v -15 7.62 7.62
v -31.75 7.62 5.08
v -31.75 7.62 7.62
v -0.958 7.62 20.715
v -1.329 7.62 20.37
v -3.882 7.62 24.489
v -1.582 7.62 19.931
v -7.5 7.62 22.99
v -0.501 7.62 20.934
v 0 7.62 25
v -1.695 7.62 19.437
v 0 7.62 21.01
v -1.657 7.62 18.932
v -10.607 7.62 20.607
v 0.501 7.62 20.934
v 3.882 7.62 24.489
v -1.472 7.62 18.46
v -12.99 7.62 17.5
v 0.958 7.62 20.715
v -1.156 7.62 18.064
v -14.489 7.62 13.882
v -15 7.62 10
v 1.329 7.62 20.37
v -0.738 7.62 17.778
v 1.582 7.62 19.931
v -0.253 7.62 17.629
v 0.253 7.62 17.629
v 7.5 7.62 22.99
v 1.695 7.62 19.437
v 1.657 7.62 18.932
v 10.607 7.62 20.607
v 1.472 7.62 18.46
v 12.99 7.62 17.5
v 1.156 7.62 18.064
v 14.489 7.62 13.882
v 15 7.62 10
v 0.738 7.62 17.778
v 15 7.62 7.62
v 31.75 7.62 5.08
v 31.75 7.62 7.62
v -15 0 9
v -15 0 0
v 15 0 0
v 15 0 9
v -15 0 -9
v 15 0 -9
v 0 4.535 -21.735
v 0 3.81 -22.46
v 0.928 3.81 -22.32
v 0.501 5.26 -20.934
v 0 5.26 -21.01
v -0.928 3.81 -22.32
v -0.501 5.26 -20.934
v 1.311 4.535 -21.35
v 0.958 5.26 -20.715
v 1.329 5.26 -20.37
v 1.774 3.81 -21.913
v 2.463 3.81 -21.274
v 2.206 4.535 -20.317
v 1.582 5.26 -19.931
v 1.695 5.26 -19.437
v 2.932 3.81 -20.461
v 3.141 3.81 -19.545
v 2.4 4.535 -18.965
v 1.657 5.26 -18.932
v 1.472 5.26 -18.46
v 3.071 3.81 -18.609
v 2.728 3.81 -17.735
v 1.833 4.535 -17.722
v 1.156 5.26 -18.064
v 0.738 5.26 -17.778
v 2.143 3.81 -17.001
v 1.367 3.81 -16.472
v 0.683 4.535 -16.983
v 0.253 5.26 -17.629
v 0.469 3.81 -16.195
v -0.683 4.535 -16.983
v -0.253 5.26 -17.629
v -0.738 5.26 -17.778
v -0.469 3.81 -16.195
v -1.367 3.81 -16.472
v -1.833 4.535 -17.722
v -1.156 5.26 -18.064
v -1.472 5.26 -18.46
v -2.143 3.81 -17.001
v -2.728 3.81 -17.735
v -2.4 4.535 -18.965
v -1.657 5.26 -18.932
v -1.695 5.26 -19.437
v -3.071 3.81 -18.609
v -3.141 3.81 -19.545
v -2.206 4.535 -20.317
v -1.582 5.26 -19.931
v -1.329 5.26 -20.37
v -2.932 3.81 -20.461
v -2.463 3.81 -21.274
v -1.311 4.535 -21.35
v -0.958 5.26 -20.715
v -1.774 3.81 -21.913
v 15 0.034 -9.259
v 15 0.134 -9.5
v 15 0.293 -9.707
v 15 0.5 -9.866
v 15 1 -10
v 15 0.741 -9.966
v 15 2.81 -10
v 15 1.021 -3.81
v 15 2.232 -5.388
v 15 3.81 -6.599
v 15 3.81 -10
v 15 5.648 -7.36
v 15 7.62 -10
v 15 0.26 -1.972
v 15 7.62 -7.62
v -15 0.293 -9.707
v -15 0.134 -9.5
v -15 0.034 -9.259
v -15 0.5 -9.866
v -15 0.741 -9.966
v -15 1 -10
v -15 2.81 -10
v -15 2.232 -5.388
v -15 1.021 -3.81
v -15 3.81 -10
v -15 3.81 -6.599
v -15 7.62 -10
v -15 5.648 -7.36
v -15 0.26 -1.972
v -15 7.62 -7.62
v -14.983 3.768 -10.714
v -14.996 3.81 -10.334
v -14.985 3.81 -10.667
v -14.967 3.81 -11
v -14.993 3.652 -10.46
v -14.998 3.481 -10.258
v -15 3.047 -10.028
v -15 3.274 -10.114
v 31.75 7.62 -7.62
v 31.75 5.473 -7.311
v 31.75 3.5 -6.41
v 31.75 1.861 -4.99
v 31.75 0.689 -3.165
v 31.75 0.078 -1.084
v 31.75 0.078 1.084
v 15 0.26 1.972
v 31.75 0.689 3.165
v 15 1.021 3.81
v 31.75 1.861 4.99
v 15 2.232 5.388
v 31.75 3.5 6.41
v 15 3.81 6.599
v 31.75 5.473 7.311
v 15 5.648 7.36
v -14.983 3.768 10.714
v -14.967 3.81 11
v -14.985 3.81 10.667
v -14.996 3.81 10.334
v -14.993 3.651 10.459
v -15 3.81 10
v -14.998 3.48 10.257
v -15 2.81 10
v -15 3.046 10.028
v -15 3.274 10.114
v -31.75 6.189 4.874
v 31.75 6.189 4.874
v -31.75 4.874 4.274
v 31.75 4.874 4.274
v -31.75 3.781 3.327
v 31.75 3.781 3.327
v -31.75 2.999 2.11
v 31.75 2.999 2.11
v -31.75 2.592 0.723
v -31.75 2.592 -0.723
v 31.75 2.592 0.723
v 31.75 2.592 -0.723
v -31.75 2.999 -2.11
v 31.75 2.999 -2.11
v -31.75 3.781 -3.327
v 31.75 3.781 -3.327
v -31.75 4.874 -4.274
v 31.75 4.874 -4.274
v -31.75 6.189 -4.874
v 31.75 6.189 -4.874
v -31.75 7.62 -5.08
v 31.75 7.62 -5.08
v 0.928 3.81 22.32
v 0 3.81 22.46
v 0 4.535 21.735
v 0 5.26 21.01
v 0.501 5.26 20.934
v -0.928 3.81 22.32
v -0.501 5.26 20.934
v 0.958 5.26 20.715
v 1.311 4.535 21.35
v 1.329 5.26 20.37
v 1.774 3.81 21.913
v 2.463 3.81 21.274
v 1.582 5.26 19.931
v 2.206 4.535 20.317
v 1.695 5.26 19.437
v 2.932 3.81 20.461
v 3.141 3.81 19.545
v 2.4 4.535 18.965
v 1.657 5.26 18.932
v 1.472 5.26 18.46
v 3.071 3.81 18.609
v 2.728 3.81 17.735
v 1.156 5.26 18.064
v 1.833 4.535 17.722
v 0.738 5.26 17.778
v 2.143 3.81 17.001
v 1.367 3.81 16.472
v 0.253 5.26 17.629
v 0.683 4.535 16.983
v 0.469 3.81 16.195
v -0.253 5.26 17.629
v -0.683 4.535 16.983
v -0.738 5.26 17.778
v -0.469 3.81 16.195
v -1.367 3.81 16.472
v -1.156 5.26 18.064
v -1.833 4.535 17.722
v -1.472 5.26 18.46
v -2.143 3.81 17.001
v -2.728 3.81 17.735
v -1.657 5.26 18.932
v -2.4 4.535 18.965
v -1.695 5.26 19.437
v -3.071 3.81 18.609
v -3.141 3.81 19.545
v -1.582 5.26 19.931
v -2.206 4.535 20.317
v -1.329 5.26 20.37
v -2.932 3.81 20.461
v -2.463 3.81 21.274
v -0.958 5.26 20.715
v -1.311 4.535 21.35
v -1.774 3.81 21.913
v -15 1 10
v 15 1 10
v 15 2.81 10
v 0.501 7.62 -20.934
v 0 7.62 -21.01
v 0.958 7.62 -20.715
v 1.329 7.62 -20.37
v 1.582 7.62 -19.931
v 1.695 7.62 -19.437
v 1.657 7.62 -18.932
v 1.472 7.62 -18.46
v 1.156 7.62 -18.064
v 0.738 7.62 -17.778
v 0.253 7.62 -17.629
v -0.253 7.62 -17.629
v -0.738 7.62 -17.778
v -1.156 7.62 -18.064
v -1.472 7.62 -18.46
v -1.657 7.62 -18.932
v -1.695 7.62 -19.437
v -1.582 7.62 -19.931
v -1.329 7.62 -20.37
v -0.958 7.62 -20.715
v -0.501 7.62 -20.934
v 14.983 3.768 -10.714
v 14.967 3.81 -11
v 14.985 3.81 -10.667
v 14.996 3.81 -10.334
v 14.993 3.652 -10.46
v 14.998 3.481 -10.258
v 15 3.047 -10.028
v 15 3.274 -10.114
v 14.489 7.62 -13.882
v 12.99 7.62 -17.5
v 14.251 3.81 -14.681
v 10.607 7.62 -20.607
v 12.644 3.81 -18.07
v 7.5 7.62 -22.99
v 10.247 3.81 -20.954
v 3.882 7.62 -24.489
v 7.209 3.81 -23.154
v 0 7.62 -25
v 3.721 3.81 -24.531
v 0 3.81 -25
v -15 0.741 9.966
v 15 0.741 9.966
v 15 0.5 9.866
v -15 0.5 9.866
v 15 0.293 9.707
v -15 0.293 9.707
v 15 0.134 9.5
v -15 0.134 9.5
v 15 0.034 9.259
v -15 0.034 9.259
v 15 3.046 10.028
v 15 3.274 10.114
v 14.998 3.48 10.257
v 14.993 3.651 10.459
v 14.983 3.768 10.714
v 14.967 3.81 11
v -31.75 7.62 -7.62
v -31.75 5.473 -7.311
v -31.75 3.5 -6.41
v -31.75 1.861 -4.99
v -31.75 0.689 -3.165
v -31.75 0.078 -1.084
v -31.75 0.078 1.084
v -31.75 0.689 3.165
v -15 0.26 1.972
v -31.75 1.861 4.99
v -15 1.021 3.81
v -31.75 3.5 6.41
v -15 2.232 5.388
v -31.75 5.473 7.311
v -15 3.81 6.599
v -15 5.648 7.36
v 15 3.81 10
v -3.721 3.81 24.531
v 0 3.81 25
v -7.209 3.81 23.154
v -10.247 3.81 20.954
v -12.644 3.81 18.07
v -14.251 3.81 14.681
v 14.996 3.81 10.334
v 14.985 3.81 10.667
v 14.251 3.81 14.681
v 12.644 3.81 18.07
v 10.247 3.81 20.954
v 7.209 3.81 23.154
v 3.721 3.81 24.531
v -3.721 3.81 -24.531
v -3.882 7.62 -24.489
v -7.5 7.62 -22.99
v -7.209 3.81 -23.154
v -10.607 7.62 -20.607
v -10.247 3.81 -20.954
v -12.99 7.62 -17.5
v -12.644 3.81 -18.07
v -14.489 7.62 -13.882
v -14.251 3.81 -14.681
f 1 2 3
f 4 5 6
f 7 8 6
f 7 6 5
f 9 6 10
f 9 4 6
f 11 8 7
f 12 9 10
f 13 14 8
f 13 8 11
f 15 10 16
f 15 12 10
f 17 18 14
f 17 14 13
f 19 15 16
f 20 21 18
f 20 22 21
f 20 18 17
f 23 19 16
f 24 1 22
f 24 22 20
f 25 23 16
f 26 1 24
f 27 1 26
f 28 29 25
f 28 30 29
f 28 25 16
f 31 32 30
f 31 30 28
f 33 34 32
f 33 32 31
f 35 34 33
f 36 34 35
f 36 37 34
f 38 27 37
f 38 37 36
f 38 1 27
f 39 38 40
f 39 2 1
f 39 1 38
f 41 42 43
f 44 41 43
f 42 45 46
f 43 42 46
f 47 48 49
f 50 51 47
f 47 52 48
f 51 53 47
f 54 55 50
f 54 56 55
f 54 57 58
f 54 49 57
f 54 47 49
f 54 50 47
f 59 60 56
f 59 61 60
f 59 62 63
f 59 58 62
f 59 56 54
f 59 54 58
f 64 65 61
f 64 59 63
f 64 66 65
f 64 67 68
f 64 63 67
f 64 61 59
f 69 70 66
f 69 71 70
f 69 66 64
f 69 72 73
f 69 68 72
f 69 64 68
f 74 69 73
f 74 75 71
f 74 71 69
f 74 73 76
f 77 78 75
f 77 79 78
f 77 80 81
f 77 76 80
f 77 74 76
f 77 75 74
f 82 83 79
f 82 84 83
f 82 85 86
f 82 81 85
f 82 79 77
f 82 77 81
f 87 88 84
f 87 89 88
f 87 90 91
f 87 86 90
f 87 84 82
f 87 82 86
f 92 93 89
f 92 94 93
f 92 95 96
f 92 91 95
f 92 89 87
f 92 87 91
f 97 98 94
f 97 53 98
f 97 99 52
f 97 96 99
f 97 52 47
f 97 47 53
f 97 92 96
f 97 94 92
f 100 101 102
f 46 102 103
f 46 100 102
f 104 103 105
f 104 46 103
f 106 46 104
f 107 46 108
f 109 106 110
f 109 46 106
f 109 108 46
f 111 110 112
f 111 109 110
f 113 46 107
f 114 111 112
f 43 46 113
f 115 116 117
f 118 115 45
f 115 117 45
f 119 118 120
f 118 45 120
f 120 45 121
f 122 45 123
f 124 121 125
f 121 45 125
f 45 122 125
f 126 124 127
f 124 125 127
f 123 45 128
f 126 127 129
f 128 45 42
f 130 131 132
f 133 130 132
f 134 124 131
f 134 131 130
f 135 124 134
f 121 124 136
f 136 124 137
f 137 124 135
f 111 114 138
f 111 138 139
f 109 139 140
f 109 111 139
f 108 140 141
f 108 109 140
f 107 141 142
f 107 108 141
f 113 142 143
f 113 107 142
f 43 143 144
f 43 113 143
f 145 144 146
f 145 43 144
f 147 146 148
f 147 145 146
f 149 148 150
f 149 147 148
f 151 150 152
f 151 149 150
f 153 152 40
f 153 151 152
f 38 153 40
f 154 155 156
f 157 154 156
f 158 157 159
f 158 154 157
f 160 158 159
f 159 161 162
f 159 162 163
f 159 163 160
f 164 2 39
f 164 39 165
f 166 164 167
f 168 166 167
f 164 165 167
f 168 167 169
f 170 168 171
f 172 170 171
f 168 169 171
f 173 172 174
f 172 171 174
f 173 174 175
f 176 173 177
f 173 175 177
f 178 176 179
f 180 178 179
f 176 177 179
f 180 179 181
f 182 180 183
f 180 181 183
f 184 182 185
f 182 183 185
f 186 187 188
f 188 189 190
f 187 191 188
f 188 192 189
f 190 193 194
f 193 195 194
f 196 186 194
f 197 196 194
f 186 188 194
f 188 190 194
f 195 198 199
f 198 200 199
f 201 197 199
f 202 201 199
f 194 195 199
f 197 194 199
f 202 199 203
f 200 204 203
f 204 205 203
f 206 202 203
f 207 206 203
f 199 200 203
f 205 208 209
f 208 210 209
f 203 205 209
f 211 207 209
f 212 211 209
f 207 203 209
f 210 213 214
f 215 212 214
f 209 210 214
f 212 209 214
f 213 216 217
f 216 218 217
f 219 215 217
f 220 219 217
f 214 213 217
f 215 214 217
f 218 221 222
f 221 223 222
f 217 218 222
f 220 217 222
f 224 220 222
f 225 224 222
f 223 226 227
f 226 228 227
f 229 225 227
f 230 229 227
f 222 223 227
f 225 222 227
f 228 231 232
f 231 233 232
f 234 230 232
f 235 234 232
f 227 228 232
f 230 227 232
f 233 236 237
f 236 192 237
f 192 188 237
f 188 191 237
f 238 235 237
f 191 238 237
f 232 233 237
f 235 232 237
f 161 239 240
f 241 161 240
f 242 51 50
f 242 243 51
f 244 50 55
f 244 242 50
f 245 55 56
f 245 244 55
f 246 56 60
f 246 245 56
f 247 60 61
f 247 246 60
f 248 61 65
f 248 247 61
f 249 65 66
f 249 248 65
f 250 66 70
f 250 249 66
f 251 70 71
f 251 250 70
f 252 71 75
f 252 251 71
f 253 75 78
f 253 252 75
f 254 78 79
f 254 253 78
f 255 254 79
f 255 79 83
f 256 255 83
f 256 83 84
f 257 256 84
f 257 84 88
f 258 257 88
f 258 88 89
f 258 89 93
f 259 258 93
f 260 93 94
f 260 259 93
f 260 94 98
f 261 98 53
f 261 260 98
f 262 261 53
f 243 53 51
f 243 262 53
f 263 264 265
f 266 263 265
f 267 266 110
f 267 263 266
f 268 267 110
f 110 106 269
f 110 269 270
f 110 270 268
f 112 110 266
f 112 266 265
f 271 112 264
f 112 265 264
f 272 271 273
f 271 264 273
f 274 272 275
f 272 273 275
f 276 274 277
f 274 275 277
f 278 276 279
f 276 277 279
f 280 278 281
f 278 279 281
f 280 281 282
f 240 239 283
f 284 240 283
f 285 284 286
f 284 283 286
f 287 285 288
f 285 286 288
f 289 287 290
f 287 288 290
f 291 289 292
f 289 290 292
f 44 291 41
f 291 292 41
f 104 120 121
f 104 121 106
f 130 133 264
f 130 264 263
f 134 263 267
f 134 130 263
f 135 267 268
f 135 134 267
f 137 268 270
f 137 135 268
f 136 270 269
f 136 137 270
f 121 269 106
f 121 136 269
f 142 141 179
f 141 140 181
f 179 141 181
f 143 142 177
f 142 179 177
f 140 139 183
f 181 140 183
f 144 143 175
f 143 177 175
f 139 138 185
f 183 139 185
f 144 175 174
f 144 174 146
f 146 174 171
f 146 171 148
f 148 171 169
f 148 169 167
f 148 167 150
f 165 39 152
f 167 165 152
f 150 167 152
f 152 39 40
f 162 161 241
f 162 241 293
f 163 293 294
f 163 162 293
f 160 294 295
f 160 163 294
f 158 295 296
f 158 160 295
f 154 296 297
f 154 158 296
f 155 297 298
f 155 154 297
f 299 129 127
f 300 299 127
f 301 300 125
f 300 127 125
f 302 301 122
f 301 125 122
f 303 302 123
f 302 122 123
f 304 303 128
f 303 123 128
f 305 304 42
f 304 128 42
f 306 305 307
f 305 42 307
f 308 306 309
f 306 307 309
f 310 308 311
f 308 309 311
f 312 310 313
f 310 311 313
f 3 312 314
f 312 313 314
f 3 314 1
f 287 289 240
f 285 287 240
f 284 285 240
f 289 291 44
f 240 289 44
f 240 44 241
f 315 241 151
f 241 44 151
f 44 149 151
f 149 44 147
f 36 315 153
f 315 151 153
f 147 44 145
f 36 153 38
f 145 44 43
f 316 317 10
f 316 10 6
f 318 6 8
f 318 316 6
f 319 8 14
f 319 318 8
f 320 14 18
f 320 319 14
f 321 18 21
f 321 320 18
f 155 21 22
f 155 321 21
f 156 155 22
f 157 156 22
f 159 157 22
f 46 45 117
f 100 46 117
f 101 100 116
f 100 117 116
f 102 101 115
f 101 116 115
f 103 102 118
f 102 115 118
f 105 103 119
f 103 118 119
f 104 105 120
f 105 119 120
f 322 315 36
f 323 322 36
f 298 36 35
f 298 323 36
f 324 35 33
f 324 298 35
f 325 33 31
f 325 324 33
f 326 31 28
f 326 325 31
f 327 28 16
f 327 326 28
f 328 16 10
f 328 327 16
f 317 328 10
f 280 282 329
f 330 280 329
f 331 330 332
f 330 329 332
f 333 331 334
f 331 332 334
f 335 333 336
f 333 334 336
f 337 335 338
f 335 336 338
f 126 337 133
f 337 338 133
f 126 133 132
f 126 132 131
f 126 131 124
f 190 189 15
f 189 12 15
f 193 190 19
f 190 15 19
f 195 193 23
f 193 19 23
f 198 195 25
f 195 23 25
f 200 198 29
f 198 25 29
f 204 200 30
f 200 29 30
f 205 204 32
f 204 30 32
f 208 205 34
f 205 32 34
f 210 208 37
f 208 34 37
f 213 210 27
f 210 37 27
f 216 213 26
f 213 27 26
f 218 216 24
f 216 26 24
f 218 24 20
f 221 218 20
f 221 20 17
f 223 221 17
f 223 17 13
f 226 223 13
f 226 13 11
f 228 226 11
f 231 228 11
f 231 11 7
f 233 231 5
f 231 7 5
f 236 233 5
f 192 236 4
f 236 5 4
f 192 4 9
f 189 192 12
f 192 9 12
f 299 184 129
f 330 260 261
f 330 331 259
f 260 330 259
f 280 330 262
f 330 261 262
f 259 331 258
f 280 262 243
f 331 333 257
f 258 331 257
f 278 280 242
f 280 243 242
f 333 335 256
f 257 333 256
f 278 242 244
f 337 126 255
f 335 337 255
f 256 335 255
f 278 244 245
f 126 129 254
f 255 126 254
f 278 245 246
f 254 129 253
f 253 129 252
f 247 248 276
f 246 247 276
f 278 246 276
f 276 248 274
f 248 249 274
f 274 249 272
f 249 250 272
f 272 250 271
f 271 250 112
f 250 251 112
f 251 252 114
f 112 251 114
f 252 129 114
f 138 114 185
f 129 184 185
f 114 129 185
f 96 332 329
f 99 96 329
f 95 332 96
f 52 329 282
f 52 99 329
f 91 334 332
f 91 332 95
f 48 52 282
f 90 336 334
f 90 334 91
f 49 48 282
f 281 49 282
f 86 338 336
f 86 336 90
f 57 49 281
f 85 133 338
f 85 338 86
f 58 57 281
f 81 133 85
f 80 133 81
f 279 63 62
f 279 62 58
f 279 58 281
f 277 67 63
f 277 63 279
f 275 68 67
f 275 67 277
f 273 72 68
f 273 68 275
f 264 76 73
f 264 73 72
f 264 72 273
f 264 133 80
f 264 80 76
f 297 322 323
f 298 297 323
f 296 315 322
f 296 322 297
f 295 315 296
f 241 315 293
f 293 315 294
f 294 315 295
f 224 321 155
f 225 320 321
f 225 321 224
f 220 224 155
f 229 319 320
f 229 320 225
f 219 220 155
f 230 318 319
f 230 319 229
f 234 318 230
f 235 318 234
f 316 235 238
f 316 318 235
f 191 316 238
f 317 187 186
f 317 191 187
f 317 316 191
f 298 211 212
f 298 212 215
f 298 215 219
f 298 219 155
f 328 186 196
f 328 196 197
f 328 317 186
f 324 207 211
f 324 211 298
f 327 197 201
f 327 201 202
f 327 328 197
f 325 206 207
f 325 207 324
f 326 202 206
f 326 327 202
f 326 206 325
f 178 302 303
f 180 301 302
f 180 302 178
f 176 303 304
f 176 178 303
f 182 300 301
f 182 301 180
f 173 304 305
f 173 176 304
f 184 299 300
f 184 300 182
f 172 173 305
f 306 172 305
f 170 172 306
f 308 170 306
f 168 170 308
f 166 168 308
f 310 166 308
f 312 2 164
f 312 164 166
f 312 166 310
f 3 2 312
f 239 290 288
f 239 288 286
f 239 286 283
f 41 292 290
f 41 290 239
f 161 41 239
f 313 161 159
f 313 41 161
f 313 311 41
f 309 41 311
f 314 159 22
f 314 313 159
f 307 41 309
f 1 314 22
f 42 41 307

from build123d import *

# Parameters (mm, degrees)
SKETCH1_W                                           = 30
SKETCH1_H                                           = 30
BOSS_EXTRUDE1_DEPTH                                 = 7.62
BOSS_EXTRUDE2_DEPTH                                 = 16.75
CUT_EXTRUDE2_DEPTH                                  = 35.39570322
SKETCH3_W                                           = 30
SKETCH3_H                                           = 3.81
BOSS_EXTRUDE3_DEPTH                                 = 10
CSK_FOR_M3_COUNTERSUNK_FLAT_HEAD_SCREW1_D           = 3.4
CSK_FOR_M3_COUNTERSUNK_FLAT_HEAD_SCREW1_CSINK_D     = 6.3
CSK_FOR_M3_COUNTERSUNK_FLAT_HEAD_SCREW1_CSINK_ANGLE = 90
CUT_EXTRUDE3_START                                  = -10
CUT_EXTRUDE3_DEPTH                                  = 52.123313339
SKETCH6_W                                           = 30
SKETCH6_H                                           = 5
CUT_EXTRUDE5_DEPTH                                  = 3.81
FILLET1_R                                           = 1


with BuildPart() as part:
    # Sketch1 → Boss-Extrude1 (new body)
    with BuildSketch(Plane(origin=(0, 0, 0), x_dir=(1, 0, 0), z_dir=(0, 1, 0))):
        Rectangle(SKETCH1_W, SKETCH1_H)
    extrude(amount=BOSS_EXTRUDE1_DEPTH)

    # Sketch2 → Boss-Extrude2 (add)
    with BuildSketch(Plane(origin=(15, 0, 0), x_dir=(0, 0, -1), z_dir=(1, 0, 0))):
        with BuildLine():
            Line((-7.62, 7.62), (-5.08, 7.62))
            ThreePointArc((-5.08, 7.62), (0, 2.54), (5.08, 7.62))
            Line((5.08, 7.62), (7.62, 7.62))
            ThreePointArc((7.62, 7.62), (0, 0), (-7.62, 7.62))
        make_face()
    boss_extrude2 = extrude(amount=BOSS_EXTRUDE2_DEPTH)

    # Sketch2<4> → Cut-Extrude2 (cut, through all)
    with BuildSketch(Plane(origin=(15, 0, 0), x_dir=(0, 0, -1), z_dir=(1, 0, 0))):
        with BuildLine():
            Line((5.08, 7.62), (-5.08, 7.62))
            ThreePointArc((-5.08, 7.62), (0, 2.54), (5.08, 7.62))
        make_face()
    extrude(amount=-CUT_EXTRUDE2_DEPTH, mode=Mode.SUBTRACT)

    # Mirror1: Boss-Extrude2 across plane
    add(boss_extrude2.mirror(Plane(origin=(0, 0, 0), x_dir=(0, 0, 1), z_dir=(1, 0, 0))))

    # Sketch3 → Boss-Extrude3 (add)
    with BuildSketch(Plane.XY.offset(15)):
        with Locations((0, 5.715)):
            Rectangle(SKETCH3_W, SKETCH3_H)
    boss_extrude3 = extrude(amount=BOSS_EXTRUDE3_DEPTH)

    # CSK for M3 Countersunk Flat Head Screw1 (through all)
    with Locations(Plane(origin=(0, 3.81, 19.31), x_dir=(0, 0, -1), z_dir=(0, -1, 0))):
        with Locations((0, 0)):
            csk_for_m3_countersunk_flat_head_screw1 = CounterSinkHole(CSK_FOR_M3_COUNTERSUNK_FLAT_HEAD_SCREW1_D / 2, CSK_FOR_M3_COUNTERSUNK_FLAT_HEAD_SCREW1_CSINK_D / 2, counter_sink_angle=CSK_FOR_M3_COUNTERSUNK_FLAT_HEAD_SCREW1_CSINK_ANGLE)

    # Sketch4 → Cut-Extrude3 (cut)
    with BuildSketch(Plane(origin=(0, 7.62, 0), x_dir=(1, 0, 0), z_dir=(0, 1, 0)).offset(CUT_EXTRUDE3_START)):
        with BuildLine():
            Line((-15, -25), (-1.2e-08, -25))
            ThreePointArc((-1.2e-08, -25), (-10.606601722, -20.606601713), (-15, -10))
            Line((-15, -10), (-15, -25))
        make_face()
        with BuildLine():
            Line((15, -25), (15, -10))
            ThreePointArc((15, -10), (10.606601713, -20.606601722), (-1.2e-08, -25))
            Line((-1.2e-08, -25), (15, -25))
        make_face()
    cut_extrude3 = extrude(amount=CUT_EXTRUDE3_DEPTH, mode=Mode.SUBTRACT)

    # Mirror2: Boss-Extrude3, CSK for M3 Countersunk Flat Head Screw1, Cut-Extrude3 across plane
    add(boss_extrude3.mirror(Plane.XY))
    add(csk_for_m3_countersunk_flat_head_screw1.mirror(Plane.XY), mode=Mode.SUBTRACT)
    add(cut_extrude3.mirror(Plane.XY), mode=Mode.SUBTRACT)

    # Sketch6 → Cut-Extrude5 (cut)
    with BuildSketch(Plane.XZ):
        with Locations((0, 12.5)):
            Rectangle(SKETCH6_W, SKETCH6_H)
        with Locations((0, -12.5)):
            Rectangle(SKETCH6_W, SKETCH6_H)
    extrude(amount=-CUT_EXTRUDE5_DEPTH, mode=Mode.SUBTRACT)

    # Fillet1
    # the kernel refuses this fillet: 1 mm, written as the material it adds along each edge
    with BuildSketch(Plane(origin=(-17.5, 3.81, 10), x_dir=(0, 0, 1), z_dir=(1, 0, 0))) as fillet1_piece_1_section:
        with BuildLine():
            CenterArc((FILLET1_R, FILLET1_R), FILLET1_R, 180, 90)
            Line((0, FILLET1_R), (0, 0))
            Line((0, 0), (FILLET1_R, 0))
        make_face()
    fillet1_piece_1 = extrude(amount=35, mode=Mode.PRIVATE)
    fillet1_piece_1 = fillet1_piece_1 & Plane(origin=(0, 3.58660625, 10), x_dir=(-8.322182034394214e-10, 0, 1.0), z_dir=(0, -1, 0)) * Cylinder(15, 74, mode=Mode.PRIVATE)
    add(fillet1_piece_1)
    with BuildSketch(Plane(origin=(-17.5, 3.81, -10), x_dir=(0, 0, -1), z_dir=(1, 0, 0))) as fillet1_piece_2_section:
        with BuildLine():
            CenterArc((FILLET1_R, -FILLET1_R), FILLET1_R, 90, 90)
            Line((0, -FILLET1_R), (0, 0))
            Line((0, 0), (FILLET1_R, 0))
        make_face()
    fillet1_piece_2 = extrude(amount=35, mode=Mode.PRIVATE)
    fillet1_piece_2 = fillet1_piece_2 & Plane(origin=(0, 3.586606238, -10), x_dir=(1, 0, 0), z_dir=(0, -1, 0)) * Cylinder(15, 74, mode=Mode.PRIVATE)
    add(fillet1_piece_2)
    # the kernel refuses this fillet: 1 mm, written as the material it takes off along each edge
    with BuildSketch(Plane(origin=(-17.5, 0, 10), x_dir=(0, 1, 0), z_dir=(1, 0, 0)), Plane(origin=(-17.5, 0, -10), x_dir=(0, 0, 1), z_dir=(1, 0, 0))) as fillet1_2_piece_1:
        with BuildLine():
            CenterArc((FILLET1_R, -FILLET1_R), FILLET1_R, 90, 90)
            Line((0, -FILLET1_R), (0, 0))
            Line((0, 0), (FILLET1_R, 0))
        make_face()
    extrude(amount=35, mode=Mode.SUBTRACT)


solid = part.part
